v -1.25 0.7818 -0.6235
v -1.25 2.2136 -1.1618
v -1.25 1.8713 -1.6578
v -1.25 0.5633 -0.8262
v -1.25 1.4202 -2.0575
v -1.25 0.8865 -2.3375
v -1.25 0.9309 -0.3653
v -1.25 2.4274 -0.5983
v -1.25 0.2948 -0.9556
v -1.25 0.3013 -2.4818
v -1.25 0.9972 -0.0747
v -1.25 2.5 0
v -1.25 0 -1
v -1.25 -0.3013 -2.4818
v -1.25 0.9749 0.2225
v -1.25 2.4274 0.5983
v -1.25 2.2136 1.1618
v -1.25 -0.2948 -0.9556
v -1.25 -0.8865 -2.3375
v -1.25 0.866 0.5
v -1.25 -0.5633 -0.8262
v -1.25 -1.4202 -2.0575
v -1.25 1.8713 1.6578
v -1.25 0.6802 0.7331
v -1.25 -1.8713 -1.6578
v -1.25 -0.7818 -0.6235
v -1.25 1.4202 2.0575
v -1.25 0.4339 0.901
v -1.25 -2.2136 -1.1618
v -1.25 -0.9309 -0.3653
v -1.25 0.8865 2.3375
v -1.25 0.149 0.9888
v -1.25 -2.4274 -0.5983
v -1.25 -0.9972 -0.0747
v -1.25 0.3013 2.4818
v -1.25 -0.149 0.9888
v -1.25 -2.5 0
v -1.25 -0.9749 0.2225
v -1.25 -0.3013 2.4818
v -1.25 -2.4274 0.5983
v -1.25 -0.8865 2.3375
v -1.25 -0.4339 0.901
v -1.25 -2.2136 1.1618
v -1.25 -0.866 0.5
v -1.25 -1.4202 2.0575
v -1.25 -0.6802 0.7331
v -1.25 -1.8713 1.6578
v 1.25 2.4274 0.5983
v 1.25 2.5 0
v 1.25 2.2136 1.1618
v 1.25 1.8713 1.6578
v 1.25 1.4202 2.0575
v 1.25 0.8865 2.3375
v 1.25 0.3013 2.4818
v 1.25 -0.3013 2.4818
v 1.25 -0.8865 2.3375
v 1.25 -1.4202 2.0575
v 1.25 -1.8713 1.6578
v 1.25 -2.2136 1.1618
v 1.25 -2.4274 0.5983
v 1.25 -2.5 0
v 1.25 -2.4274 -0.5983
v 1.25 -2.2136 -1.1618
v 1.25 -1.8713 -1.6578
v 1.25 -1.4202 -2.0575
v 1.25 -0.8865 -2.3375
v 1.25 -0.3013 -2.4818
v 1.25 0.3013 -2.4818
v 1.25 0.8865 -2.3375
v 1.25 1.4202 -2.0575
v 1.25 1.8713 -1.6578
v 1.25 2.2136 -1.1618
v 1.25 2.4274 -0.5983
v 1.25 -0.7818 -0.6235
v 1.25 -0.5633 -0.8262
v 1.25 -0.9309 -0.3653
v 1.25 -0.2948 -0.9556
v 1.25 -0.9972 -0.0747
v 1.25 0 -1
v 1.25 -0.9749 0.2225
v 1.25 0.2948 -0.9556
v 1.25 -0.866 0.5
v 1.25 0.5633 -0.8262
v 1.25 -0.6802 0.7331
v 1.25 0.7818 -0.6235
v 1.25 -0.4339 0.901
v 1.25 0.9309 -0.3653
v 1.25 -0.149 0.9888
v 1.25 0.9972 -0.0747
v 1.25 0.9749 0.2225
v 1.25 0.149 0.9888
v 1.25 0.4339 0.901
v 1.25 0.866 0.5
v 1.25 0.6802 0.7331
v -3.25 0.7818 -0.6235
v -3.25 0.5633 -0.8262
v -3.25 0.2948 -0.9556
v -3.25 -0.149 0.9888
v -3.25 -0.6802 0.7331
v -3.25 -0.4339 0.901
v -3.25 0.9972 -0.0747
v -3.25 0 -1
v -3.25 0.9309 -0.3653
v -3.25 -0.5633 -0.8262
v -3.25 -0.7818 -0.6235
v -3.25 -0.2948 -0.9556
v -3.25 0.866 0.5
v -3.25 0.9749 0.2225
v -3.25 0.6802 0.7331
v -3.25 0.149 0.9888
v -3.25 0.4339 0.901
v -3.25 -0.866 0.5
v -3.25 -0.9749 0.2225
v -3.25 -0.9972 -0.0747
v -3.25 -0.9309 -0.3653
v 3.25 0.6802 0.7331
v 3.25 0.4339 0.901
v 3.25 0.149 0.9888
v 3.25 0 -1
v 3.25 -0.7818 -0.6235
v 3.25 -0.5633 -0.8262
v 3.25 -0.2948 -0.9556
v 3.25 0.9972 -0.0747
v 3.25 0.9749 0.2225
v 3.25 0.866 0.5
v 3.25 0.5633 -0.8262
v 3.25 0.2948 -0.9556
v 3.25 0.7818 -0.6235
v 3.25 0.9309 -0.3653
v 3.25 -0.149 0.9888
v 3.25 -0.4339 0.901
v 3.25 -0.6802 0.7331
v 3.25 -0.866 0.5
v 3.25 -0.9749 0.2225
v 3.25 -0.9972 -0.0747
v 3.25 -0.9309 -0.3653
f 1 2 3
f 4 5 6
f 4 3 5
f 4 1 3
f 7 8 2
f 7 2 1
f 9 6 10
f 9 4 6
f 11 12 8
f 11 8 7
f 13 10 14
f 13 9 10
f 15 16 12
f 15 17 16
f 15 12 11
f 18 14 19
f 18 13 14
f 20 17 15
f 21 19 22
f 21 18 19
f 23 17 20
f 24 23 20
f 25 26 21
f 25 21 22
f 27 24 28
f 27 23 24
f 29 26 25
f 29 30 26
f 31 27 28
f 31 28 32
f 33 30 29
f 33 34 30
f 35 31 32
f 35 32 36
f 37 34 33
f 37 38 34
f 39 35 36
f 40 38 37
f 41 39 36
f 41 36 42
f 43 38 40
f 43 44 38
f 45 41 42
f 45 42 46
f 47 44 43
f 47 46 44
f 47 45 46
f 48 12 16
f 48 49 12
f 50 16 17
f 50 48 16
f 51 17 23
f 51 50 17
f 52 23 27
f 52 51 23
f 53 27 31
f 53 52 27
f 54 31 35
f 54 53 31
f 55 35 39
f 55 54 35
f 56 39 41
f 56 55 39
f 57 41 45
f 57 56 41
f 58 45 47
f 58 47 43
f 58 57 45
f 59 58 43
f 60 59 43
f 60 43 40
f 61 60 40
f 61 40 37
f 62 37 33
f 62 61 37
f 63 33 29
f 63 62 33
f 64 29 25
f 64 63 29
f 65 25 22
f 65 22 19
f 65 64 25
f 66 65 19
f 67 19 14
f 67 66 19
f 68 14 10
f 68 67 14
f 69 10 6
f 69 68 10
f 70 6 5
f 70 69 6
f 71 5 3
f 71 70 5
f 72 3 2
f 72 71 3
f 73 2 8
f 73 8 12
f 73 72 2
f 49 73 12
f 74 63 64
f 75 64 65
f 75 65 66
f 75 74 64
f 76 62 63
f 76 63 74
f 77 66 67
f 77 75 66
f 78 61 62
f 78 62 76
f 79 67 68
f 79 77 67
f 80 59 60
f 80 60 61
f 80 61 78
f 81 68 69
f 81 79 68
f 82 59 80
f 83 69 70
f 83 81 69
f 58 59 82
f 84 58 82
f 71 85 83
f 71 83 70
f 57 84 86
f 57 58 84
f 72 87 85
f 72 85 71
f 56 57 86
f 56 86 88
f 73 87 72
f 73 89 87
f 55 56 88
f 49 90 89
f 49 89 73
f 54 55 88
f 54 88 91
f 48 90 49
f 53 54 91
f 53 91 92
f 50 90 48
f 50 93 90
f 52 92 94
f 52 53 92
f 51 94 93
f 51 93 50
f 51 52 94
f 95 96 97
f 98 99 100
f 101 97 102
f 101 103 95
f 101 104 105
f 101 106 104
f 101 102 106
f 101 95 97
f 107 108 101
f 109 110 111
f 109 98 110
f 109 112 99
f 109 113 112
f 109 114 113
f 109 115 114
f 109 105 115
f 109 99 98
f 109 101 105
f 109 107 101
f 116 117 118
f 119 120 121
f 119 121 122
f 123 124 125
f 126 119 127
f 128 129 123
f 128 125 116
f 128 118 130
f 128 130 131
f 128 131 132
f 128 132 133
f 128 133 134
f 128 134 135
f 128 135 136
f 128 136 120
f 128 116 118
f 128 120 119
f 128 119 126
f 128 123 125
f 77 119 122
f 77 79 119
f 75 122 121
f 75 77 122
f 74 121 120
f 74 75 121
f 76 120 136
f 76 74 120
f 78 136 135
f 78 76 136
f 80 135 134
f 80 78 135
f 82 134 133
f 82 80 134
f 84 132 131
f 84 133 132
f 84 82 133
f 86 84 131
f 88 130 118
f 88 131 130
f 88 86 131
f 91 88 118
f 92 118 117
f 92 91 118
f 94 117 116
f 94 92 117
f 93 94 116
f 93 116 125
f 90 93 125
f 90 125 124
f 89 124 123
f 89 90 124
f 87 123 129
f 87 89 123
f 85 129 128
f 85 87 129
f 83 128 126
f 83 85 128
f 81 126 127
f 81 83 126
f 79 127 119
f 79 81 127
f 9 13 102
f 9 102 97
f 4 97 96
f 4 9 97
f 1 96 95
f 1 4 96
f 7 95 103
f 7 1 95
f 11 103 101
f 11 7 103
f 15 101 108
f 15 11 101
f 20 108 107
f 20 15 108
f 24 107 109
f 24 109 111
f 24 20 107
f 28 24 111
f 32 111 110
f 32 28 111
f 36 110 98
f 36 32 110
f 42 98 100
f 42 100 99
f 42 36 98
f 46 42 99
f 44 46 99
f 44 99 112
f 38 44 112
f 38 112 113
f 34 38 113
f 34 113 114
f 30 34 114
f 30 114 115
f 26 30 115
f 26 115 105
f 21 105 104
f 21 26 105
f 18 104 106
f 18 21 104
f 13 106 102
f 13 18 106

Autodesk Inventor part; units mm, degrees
ref_plane "YZ Plane" through (0, 0, 0) normal (1, 0, 0) x (0, 1, 0)
ref_plane "XZ Plane" through (0, 0, 0) normal (0, 1, 0) x (-1, 0, 0)
ref_plane "XY Plane" through (0, 0, 0) normal (0, 0, 1) x (1, 0, 0)
sketch "スケッチ1" plane through (0, 0, 0) normal (1, 0, 0) x (0, 1, 0)
  circle A0 centre (0, 0) radius 2.5
  dimension "d0" = 5
extrude "押し出し1" add sketch "スケッチ1" along normal blind 1.25
sketch "スケッチ3" plane through (1.25, 0, 0) normal (1, 0, 0) x (0, 0, -1)
  circle A0 centre (0, 0) radius 1
  dimension "d6" = 2
extrude "押し出し3" add sketch "スケッチ3" along normal blind 2
mirror "ミラー1" about plane through (0, 0, 0) normal (-1, 0, 0) of "押し出し1", "押し出し3"
properties part number "roller"
